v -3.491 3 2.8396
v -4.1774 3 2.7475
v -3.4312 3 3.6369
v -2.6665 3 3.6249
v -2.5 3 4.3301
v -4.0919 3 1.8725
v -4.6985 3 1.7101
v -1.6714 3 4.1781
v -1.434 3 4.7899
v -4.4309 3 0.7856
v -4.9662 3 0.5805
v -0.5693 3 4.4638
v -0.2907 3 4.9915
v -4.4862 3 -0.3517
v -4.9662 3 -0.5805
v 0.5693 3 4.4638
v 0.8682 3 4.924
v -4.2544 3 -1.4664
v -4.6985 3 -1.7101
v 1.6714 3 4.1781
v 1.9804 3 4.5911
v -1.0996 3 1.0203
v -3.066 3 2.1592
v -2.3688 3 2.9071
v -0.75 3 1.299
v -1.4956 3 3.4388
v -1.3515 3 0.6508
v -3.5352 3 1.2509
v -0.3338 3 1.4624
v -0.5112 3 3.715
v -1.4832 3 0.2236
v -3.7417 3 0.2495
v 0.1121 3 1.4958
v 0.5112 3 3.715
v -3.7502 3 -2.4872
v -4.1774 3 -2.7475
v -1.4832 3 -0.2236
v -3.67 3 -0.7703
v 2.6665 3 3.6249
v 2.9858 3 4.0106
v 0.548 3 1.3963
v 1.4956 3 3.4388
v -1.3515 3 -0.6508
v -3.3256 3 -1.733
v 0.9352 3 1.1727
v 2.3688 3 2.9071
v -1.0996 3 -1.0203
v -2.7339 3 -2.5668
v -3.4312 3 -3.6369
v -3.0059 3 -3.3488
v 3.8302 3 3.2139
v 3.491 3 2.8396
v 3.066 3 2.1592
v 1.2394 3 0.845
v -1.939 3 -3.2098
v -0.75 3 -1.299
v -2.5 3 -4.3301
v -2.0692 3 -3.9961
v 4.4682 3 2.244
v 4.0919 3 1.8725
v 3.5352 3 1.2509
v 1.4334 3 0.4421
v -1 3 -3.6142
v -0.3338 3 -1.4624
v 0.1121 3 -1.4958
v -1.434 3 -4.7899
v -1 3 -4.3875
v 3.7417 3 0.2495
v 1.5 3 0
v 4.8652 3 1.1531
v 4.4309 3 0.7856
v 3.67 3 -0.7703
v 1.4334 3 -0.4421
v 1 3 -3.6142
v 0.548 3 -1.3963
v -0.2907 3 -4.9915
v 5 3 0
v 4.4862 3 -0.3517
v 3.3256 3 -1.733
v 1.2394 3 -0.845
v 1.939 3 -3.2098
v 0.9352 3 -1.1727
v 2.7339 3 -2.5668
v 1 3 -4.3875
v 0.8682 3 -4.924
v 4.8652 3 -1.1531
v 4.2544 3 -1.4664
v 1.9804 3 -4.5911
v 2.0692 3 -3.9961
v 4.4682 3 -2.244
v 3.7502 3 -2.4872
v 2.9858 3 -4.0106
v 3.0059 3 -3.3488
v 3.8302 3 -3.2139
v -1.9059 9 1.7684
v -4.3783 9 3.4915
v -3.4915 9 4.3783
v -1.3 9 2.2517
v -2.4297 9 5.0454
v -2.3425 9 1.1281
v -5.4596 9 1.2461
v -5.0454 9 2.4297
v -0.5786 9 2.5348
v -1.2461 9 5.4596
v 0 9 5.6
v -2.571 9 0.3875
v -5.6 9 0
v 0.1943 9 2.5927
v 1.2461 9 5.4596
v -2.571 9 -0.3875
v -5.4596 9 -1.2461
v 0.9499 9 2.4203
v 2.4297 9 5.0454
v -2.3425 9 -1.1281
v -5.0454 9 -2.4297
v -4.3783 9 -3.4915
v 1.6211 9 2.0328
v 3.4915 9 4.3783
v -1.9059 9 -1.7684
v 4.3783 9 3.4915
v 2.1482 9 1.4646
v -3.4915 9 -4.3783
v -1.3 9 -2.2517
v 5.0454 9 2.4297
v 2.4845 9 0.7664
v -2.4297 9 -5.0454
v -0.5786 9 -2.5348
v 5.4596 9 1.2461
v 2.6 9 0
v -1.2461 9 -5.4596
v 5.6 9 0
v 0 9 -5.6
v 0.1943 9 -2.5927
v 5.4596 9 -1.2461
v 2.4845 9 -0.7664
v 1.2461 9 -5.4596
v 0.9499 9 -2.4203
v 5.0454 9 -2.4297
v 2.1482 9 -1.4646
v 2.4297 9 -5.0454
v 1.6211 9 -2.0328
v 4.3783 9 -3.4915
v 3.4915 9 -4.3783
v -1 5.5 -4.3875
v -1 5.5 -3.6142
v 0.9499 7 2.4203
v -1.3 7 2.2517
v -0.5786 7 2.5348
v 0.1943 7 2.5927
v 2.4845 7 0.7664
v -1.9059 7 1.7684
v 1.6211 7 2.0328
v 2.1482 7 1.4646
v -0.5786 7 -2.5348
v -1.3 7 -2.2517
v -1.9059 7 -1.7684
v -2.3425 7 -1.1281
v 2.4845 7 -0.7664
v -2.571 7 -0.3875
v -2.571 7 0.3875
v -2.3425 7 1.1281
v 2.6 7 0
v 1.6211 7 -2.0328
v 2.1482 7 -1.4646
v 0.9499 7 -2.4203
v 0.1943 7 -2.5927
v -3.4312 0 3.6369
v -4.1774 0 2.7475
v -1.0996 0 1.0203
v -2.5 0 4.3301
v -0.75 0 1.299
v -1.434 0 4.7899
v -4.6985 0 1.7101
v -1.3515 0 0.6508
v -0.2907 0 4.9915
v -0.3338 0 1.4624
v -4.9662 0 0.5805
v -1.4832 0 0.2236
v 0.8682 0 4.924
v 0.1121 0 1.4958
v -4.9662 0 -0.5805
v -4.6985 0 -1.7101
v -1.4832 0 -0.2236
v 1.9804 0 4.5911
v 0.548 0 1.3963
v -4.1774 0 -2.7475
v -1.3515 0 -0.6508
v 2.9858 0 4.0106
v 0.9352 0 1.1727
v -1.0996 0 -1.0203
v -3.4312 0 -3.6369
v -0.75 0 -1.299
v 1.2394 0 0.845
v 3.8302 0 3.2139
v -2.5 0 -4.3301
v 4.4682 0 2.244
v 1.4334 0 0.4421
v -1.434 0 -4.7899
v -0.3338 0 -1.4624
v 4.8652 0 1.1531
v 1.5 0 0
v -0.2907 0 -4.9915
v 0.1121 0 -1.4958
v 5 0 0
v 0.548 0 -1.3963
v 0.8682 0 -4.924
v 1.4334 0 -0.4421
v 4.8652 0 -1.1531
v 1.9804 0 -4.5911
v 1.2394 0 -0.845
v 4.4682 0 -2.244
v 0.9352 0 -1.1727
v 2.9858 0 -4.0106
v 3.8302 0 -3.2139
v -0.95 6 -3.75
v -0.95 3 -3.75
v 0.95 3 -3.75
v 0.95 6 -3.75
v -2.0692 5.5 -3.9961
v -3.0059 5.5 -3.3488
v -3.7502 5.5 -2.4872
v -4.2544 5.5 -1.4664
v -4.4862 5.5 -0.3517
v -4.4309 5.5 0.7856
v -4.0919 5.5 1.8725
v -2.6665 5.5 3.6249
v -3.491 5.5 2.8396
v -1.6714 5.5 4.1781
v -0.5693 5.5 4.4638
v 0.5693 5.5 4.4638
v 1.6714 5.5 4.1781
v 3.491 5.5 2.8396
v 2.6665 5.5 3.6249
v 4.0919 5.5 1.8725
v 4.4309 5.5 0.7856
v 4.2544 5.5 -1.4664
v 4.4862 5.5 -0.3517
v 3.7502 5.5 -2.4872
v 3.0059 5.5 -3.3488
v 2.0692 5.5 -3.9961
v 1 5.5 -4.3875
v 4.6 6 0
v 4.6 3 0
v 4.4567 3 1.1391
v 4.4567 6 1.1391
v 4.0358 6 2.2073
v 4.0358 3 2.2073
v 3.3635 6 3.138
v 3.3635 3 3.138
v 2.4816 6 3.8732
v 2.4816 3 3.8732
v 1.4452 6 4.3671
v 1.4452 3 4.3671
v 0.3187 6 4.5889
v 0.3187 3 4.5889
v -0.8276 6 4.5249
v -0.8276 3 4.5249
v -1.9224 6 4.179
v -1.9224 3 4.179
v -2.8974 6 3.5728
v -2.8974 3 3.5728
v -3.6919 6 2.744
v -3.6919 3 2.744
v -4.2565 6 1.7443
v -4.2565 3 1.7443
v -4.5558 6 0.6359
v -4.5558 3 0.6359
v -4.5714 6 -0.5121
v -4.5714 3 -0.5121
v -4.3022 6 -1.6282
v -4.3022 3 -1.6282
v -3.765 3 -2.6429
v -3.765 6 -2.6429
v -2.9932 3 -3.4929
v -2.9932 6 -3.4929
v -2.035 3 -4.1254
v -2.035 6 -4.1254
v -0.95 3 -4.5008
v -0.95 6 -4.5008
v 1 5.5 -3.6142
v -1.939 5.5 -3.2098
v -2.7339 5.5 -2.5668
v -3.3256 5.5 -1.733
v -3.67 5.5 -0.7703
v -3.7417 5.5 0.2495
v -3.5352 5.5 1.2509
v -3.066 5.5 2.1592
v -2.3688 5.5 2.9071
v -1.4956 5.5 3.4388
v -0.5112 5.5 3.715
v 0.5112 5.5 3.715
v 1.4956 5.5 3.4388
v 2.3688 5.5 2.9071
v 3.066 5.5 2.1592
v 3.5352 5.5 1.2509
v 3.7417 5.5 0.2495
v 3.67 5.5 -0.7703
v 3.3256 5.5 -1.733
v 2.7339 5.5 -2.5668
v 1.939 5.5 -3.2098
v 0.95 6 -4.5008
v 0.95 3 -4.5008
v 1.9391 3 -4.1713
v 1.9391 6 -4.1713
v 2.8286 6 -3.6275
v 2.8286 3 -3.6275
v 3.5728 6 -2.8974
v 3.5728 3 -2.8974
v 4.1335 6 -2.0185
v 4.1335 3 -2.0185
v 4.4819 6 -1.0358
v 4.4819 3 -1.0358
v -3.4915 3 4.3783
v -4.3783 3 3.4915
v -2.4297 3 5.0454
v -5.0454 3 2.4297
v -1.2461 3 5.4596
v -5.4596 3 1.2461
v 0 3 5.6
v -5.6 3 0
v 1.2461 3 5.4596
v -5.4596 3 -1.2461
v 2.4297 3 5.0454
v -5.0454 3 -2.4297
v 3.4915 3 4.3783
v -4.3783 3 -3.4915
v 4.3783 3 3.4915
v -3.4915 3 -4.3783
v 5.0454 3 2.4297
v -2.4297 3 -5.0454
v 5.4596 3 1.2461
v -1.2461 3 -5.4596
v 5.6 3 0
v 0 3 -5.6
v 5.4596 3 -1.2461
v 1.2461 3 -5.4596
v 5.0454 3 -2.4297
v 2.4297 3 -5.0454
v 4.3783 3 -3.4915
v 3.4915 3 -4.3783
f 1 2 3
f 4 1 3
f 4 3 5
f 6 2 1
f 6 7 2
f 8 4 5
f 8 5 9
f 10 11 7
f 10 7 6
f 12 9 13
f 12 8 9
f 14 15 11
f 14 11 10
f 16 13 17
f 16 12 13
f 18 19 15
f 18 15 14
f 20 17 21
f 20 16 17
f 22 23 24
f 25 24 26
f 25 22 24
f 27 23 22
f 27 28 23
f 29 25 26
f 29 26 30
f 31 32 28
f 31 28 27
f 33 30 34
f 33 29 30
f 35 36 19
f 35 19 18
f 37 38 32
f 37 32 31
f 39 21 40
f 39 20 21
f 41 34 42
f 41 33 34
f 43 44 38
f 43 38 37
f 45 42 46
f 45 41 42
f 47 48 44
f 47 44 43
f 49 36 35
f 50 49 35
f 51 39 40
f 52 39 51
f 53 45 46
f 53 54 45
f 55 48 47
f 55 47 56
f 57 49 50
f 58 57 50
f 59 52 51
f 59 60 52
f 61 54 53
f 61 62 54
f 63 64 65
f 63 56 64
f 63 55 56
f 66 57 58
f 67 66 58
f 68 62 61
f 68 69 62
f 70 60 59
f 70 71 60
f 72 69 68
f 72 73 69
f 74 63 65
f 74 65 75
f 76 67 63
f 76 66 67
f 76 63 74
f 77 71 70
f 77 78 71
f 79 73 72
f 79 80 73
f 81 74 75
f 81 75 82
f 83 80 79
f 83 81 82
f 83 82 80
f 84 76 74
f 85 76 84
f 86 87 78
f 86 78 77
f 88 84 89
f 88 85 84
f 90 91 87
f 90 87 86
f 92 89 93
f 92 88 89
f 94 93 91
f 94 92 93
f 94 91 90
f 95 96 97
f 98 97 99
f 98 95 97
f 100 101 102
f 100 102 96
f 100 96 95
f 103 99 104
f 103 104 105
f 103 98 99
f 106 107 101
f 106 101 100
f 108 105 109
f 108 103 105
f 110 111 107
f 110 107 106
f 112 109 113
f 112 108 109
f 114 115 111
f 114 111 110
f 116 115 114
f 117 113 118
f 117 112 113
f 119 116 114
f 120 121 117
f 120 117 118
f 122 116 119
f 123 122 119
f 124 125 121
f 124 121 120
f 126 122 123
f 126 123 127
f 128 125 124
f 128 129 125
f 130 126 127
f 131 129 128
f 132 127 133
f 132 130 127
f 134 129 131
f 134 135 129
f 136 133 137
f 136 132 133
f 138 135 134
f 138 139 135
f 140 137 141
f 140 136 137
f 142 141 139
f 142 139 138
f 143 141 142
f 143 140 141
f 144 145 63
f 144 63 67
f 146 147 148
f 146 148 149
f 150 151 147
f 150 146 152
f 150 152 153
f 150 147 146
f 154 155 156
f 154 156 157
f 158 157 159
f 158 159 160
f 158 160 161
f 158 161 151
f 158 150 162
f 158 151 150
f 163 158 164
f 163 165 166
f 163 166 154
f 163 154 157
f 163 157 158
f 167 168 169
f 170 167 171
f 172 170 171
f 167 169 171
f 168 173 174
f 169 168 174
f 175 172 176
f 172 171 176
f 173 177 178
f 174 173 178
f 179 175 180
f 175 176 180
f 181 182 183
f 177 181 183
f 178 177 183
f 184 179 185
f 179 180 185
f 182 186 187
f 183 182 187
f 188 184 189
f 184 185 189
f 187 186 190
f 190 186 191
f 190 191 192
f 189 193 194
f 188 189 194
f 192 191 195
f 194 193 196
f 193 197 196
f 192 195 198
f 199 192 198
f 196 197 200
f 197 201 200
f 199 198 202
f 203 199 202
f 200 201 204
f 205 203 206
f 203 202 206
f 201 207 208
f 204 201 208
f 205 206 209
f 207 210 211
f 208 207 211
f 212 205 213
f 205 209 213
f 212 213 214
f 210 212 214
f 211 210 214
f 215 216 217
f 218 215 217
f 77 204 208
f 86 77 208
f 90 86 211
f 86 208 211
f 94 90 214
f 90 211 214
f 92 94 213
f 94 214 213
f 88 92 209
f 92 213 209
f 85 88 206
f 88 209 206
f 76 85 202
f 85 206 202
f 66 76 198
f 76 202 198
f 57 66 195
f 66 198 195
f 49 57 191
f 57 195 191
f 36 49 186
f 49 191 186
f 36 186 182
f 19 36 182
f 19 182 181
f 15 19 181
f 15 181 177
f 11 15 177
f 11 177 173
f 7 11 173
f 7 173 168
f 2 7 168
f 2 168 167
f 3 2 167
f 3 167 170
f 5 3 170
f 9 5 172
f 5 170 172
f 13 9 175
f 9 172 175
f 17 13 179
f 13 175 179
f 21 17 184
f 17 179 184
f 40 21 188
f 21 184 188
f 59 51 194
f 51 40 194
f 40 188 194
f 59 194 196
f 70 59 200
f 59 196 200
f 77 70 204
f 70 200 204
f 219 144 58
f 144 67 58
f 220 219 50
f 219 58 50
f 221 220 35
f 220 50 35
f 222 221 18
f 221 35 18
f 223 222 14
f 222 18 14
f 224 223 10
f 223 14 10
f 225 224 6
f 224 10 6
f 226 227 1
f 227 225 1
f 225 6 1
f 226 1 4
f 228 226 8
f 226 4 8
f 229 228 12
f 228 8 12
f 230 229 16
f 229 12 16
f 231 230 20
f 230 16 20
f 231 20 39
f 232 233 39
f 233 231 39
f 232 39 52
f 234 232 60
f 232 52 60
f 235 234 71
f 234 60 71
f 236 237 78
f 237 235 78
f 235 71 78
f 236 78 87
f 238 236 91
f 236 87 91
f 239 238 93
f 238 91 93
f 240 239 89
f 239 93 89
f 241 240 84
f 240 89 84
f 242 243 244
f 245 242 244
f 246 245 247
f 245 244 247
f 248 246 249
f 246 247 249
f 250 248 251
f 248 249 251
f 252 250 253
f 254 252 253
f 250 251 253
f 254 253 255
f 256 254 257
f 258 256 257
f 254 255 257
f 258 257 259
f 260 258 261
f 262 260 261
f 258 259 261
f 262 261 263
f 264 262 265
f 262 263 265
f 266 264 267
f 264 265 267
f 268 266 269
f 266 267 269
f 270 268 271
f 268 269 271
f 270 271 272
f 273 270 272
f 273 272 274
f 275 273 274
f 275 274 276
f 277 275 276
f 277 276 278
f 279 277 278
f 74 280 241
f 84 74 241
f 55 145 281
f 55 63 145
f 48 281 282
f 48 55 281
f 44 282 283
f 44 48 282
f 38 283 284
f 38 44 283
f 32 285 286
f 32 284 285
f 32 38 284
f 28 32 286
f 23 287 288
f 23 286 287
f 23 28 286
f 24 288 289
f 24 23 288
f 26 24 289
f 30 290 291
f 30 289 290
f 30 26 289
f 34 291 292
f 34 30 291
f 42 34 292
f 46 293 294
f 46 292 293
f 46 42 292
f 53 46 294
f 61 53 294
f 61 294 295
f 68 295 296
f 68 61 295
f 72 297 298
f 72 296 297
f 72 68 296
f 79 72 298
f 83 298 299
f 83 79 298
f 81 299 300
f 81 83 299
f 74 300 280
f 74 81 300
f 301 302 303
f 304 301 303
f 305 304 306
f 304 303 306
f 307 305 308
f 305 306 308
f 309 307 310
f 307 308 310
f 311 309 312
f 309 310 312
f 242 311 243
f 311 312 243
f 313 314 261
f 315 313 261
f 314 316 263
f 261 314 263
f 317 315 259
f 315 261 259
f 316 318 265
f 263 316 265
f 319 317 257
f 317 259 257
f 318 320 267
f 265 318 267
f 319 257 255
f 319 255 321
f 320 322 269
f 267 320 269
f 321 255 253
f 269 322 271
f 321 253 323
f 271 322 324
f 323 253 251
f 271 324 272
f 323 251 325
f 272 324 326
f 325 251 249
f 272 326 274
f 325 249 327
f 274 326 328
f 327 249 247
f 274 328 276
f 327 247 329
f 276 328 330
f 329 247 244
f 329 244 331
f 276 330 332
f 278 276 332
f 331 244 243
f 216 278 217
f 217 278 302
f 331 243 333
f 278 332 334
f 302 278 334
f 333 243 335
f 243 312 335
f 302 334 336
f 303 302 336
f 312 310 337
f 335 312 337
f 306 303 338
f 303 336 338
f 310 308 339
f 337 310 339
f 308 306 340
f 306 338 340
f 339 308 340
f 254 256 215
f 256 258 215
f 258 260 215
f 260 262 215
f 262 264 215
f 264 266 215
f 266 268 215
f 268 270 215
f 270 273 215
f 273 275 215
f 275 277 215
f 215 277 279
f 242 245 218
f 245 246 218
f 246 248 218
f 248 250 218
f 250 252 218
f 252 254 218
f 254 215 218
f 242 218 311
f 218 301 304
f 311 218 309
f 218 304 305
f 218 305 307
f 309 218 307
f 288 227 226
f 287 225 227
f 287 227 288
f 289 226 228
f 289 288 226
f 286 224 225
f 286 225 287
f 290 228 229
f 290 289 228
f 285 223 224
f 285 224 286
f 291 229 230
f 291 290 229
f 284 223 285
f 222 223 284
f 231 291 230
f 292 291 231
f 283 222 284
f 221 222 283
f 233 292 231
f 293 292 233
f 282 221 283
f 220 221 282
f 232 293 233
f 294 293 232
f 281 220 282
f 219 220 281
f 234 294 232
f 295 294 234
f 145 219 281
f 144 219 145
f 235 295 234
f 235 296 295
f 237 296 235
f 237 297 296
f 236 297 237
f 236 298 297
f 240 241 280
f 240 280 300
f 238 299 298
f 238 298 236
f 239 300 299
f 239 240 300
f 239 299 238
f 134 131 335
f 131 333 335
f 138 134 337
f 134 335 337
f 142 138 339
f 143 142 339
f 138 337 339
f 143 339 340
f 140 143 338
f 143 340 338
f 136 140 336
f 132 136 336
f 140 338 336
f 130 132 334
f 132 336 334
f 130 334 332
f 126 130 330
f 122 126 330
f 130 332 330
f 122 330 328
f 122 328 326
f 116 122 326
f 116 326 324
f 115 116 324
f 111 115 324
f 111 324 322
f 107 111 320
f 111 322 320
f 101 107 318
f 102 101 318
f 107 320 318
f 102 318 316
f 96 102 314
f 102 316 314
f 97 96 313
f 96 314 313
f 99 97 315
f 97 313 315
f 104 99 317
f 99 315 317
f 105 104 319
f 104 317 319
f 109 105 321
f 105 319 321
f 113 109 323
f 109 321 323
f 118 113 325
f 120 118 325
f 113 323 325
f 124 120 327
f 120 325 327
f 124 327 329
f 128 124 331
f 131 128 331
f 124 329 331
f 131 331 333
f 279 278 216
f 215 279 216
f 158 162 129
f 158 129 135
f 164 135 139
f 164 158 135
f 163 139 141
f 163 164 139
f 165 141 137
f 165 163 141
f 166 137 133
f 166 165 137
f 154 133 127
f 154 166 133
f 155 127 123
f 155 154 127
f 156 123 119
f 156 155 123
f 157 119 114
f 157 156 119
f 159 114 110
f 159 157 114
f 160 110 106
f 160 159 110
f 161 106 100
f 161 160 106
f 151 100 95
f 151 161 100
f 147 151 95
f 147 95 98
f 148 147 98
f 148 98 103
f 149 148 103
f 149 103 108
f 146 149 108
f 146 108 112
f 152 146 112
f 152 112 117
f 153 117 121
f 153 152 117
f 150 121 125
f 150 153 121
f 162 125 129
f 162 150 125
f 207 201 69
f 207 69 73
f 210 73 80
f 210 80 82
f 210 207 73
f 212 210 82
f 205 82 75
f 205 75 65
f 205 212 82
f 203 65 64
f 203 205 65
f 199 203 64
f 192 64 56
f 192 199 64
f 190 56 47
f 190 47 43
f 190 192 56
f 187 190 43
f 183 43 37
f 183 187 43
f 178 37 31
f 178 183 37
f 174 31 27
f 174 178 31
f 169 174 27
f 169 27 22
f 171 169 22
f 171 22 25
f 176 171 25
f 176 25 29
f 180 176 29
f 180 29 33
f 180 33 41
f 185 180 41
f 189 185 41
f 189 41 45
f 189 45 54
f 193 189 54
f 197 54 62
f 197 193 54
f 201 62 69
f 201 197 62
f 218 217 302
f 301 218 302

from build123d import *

# Parameters (mm, degrees)
SKETCH1_R           = 5
SKETCH1_R_2         = 1.5
BOSS_EXTRUDE1_DEPTH = 3
SKETCH3_R           = 4.5
SKETCH3_R_2         = 3.75
BOSS_EXTRUDE2_DEPTH = 2.5
SKETCH4_W           = 2
SKETCH4_H           = 1.385791926
CUT_EXTRUDE1_DEPTH  = 2.5
SKETCH5_R           = 5.6
BOSS_EXTRUDE3_DEPTH = 3
SKETCH6_R           = 5.6
BOSS_EXTRUDE4_DEPTH = 1
SKETCH7_R           = 5.6
SKETCH7_R_2         = 2.6
BOSS_EXTRUDE5_DEPTH = 2


with BuildPart() as part:
    # Sketch1 → Boss-Extrude1 (new body)
    with BuildSketch(Plane(origin=(0, 0, 0), x_dir=(1, 0, 0), z_dir=(0, 1, 0))):
        Circle(SKETCH1_R)
        Circle(SKETCH1_R_2, mode=Mode.SUBTRACT)
    extrude(amount=BOSS_EXTRUDE1_DEPTH)

    # Sketch3 → Boss-Extrude2 (add)
    with BuildSketch(Plane(origin=(0, 3, 0), x_dir=(1, 0, 0), z_dir=(0, 1, 0))):
        Circle(SKETCH3_R)
        Circle(SKETCH3_R_2, mode=Mode.SUBTRACT)
    extrude(amount=BOSS_EXTRUDE2_DEPTH)

    # Sketch4 → Cut-Extrude1 (cut)
    with BuildSketch(Plane(origin=(0, 5.5, 0), x_dir=(1, 0, 0), z_dir=(0, 1, 0))):
        with Locations((0, 4.307104037)):
            Rectangle(SKETCH4_W, SKETCH4_H)
    extrude(amount=-CUT_EXTRUDE1_DEPTH, mode=Mode.SUBTRACT)


with BuildPart() as body_2:
    # Sketch5 → Boss-Extrude3 (new body)
    with BuildSketch(Plane(origin=(0, 3, 0), x_dir=(1, 0, 0), z_dir=(0, 1, 0))):
        Circle(SKETCH5_R)
        with BuildLine():
            ThreePointArc((5, 0), (-3.181980515, -3.856812155), (-0.95, 4.908920452))
            Line((-0.95, 4.908920452), (-0.95, 5))
            Line((-0.95, 5), (0, 5))
            Line((0, 5), (0.95, 5))
            Line((0.95, 5), (0.95, 4.908920452))
            ThreePointArc((0.95, 4.908920452), (3.856812155, 3.181980515), (5, 0))
        make_face(mode=Mode.SUBTRACT)
        with BuildLine():
            ThreePointArc((4.6, 0), (-2.897412639, -3.572814017), (-0.95, 4.500833256))
            Line((-0.95, 4.500833256), (-0.95, 4.908920452))
            ThreePointArc((-0.95, 4.908920452), (-3.181980515, -3.856812155), (5, 0))
            ThreePointArc((5, 0), (3.856812155, 3.181980515), (0.95, 4.908920452))
            Line((0.95, 4.908920452), (0.95, 4.500833256))
            ThreePointArc((0.95, 4.500833256), (3.572814017, 2.897412639), (4.6, 0))
        make_face()
        with BuildLine():
            Line((-0.95, 4.908920452), (-0.95, 4.500833256))
            ThreePointArc((-0.95, 4.500833256), (0, 4.6), (0.95, 4.500833256))
            Line((0.95, 4.500833256), (0.95, 4.908920452))
            ThreePointArc((0.95, 4.908920452), (0.477178029, 4.977178029), (0, 5))
            ThreePointArc((0, 5), (-0.477178029, 4.977178029), (-0.95, 4.908920452))
        make_face()
        with BuildLine():
            Line((-0.95, 4.500833256), (-0.95, 3.75))
            Line((-0.95, 3.75), (0, 3.75))
            Line((0, 3.75), (0.95, 3.75))
            Line((0.95, 3.75), (0.95, 4.500833256))
            ThreePointArc((0.95, 4.500833256), (0, 4.6), (-0.95, 4.500833256))
        make_face()
        with BuildLine():
            Line((-0.95, 5), (-0.95, 4.908920452))
            ThreePointArc((-0.95, 4.908920452), (-0.477178029, 4.977178029), (0, 5))
            Line((0, 5), (-0.95, 5))
        make_face()
        with BuildLine():
            Line((0.95, 5), (0, 5))
            ThreePointArc((0, 5), (0.477178029, 4.977178029), (0.95, 4.908920452))
            Line((0.95, 4.908920452), (0.95, 5))
        make_face()
    extrude(amount=BOSS_EXTRUDE3_DEPTH)

    # Sketch6 → Boss-Extrude4 (add)
    with BuildSketch(Plane(origin=(0, 6, 0), x_dir=(1, 0, 0), z_dir=(0, 1, 0))):
        Circle(SKETCH6_R)
    extrude(amount=BOSS_EXTRUDE4_DEPTH)

    # Sketch7 → Boss-Extrude5 (add)
    with BuildSketch(Plane(origin=(0, 7, 0), x_dir=(1, 0, 0), z_dir=(0, 1, 0))):
        Circle(SKETCH7_R)
        Circle(SKETCH7_R_2, mode=Mode.SUBTRACT)
    extrude(amount=BOSS_EXTRUDE5_DEPTH)


solid = Compound([part.part, body_2.part])
